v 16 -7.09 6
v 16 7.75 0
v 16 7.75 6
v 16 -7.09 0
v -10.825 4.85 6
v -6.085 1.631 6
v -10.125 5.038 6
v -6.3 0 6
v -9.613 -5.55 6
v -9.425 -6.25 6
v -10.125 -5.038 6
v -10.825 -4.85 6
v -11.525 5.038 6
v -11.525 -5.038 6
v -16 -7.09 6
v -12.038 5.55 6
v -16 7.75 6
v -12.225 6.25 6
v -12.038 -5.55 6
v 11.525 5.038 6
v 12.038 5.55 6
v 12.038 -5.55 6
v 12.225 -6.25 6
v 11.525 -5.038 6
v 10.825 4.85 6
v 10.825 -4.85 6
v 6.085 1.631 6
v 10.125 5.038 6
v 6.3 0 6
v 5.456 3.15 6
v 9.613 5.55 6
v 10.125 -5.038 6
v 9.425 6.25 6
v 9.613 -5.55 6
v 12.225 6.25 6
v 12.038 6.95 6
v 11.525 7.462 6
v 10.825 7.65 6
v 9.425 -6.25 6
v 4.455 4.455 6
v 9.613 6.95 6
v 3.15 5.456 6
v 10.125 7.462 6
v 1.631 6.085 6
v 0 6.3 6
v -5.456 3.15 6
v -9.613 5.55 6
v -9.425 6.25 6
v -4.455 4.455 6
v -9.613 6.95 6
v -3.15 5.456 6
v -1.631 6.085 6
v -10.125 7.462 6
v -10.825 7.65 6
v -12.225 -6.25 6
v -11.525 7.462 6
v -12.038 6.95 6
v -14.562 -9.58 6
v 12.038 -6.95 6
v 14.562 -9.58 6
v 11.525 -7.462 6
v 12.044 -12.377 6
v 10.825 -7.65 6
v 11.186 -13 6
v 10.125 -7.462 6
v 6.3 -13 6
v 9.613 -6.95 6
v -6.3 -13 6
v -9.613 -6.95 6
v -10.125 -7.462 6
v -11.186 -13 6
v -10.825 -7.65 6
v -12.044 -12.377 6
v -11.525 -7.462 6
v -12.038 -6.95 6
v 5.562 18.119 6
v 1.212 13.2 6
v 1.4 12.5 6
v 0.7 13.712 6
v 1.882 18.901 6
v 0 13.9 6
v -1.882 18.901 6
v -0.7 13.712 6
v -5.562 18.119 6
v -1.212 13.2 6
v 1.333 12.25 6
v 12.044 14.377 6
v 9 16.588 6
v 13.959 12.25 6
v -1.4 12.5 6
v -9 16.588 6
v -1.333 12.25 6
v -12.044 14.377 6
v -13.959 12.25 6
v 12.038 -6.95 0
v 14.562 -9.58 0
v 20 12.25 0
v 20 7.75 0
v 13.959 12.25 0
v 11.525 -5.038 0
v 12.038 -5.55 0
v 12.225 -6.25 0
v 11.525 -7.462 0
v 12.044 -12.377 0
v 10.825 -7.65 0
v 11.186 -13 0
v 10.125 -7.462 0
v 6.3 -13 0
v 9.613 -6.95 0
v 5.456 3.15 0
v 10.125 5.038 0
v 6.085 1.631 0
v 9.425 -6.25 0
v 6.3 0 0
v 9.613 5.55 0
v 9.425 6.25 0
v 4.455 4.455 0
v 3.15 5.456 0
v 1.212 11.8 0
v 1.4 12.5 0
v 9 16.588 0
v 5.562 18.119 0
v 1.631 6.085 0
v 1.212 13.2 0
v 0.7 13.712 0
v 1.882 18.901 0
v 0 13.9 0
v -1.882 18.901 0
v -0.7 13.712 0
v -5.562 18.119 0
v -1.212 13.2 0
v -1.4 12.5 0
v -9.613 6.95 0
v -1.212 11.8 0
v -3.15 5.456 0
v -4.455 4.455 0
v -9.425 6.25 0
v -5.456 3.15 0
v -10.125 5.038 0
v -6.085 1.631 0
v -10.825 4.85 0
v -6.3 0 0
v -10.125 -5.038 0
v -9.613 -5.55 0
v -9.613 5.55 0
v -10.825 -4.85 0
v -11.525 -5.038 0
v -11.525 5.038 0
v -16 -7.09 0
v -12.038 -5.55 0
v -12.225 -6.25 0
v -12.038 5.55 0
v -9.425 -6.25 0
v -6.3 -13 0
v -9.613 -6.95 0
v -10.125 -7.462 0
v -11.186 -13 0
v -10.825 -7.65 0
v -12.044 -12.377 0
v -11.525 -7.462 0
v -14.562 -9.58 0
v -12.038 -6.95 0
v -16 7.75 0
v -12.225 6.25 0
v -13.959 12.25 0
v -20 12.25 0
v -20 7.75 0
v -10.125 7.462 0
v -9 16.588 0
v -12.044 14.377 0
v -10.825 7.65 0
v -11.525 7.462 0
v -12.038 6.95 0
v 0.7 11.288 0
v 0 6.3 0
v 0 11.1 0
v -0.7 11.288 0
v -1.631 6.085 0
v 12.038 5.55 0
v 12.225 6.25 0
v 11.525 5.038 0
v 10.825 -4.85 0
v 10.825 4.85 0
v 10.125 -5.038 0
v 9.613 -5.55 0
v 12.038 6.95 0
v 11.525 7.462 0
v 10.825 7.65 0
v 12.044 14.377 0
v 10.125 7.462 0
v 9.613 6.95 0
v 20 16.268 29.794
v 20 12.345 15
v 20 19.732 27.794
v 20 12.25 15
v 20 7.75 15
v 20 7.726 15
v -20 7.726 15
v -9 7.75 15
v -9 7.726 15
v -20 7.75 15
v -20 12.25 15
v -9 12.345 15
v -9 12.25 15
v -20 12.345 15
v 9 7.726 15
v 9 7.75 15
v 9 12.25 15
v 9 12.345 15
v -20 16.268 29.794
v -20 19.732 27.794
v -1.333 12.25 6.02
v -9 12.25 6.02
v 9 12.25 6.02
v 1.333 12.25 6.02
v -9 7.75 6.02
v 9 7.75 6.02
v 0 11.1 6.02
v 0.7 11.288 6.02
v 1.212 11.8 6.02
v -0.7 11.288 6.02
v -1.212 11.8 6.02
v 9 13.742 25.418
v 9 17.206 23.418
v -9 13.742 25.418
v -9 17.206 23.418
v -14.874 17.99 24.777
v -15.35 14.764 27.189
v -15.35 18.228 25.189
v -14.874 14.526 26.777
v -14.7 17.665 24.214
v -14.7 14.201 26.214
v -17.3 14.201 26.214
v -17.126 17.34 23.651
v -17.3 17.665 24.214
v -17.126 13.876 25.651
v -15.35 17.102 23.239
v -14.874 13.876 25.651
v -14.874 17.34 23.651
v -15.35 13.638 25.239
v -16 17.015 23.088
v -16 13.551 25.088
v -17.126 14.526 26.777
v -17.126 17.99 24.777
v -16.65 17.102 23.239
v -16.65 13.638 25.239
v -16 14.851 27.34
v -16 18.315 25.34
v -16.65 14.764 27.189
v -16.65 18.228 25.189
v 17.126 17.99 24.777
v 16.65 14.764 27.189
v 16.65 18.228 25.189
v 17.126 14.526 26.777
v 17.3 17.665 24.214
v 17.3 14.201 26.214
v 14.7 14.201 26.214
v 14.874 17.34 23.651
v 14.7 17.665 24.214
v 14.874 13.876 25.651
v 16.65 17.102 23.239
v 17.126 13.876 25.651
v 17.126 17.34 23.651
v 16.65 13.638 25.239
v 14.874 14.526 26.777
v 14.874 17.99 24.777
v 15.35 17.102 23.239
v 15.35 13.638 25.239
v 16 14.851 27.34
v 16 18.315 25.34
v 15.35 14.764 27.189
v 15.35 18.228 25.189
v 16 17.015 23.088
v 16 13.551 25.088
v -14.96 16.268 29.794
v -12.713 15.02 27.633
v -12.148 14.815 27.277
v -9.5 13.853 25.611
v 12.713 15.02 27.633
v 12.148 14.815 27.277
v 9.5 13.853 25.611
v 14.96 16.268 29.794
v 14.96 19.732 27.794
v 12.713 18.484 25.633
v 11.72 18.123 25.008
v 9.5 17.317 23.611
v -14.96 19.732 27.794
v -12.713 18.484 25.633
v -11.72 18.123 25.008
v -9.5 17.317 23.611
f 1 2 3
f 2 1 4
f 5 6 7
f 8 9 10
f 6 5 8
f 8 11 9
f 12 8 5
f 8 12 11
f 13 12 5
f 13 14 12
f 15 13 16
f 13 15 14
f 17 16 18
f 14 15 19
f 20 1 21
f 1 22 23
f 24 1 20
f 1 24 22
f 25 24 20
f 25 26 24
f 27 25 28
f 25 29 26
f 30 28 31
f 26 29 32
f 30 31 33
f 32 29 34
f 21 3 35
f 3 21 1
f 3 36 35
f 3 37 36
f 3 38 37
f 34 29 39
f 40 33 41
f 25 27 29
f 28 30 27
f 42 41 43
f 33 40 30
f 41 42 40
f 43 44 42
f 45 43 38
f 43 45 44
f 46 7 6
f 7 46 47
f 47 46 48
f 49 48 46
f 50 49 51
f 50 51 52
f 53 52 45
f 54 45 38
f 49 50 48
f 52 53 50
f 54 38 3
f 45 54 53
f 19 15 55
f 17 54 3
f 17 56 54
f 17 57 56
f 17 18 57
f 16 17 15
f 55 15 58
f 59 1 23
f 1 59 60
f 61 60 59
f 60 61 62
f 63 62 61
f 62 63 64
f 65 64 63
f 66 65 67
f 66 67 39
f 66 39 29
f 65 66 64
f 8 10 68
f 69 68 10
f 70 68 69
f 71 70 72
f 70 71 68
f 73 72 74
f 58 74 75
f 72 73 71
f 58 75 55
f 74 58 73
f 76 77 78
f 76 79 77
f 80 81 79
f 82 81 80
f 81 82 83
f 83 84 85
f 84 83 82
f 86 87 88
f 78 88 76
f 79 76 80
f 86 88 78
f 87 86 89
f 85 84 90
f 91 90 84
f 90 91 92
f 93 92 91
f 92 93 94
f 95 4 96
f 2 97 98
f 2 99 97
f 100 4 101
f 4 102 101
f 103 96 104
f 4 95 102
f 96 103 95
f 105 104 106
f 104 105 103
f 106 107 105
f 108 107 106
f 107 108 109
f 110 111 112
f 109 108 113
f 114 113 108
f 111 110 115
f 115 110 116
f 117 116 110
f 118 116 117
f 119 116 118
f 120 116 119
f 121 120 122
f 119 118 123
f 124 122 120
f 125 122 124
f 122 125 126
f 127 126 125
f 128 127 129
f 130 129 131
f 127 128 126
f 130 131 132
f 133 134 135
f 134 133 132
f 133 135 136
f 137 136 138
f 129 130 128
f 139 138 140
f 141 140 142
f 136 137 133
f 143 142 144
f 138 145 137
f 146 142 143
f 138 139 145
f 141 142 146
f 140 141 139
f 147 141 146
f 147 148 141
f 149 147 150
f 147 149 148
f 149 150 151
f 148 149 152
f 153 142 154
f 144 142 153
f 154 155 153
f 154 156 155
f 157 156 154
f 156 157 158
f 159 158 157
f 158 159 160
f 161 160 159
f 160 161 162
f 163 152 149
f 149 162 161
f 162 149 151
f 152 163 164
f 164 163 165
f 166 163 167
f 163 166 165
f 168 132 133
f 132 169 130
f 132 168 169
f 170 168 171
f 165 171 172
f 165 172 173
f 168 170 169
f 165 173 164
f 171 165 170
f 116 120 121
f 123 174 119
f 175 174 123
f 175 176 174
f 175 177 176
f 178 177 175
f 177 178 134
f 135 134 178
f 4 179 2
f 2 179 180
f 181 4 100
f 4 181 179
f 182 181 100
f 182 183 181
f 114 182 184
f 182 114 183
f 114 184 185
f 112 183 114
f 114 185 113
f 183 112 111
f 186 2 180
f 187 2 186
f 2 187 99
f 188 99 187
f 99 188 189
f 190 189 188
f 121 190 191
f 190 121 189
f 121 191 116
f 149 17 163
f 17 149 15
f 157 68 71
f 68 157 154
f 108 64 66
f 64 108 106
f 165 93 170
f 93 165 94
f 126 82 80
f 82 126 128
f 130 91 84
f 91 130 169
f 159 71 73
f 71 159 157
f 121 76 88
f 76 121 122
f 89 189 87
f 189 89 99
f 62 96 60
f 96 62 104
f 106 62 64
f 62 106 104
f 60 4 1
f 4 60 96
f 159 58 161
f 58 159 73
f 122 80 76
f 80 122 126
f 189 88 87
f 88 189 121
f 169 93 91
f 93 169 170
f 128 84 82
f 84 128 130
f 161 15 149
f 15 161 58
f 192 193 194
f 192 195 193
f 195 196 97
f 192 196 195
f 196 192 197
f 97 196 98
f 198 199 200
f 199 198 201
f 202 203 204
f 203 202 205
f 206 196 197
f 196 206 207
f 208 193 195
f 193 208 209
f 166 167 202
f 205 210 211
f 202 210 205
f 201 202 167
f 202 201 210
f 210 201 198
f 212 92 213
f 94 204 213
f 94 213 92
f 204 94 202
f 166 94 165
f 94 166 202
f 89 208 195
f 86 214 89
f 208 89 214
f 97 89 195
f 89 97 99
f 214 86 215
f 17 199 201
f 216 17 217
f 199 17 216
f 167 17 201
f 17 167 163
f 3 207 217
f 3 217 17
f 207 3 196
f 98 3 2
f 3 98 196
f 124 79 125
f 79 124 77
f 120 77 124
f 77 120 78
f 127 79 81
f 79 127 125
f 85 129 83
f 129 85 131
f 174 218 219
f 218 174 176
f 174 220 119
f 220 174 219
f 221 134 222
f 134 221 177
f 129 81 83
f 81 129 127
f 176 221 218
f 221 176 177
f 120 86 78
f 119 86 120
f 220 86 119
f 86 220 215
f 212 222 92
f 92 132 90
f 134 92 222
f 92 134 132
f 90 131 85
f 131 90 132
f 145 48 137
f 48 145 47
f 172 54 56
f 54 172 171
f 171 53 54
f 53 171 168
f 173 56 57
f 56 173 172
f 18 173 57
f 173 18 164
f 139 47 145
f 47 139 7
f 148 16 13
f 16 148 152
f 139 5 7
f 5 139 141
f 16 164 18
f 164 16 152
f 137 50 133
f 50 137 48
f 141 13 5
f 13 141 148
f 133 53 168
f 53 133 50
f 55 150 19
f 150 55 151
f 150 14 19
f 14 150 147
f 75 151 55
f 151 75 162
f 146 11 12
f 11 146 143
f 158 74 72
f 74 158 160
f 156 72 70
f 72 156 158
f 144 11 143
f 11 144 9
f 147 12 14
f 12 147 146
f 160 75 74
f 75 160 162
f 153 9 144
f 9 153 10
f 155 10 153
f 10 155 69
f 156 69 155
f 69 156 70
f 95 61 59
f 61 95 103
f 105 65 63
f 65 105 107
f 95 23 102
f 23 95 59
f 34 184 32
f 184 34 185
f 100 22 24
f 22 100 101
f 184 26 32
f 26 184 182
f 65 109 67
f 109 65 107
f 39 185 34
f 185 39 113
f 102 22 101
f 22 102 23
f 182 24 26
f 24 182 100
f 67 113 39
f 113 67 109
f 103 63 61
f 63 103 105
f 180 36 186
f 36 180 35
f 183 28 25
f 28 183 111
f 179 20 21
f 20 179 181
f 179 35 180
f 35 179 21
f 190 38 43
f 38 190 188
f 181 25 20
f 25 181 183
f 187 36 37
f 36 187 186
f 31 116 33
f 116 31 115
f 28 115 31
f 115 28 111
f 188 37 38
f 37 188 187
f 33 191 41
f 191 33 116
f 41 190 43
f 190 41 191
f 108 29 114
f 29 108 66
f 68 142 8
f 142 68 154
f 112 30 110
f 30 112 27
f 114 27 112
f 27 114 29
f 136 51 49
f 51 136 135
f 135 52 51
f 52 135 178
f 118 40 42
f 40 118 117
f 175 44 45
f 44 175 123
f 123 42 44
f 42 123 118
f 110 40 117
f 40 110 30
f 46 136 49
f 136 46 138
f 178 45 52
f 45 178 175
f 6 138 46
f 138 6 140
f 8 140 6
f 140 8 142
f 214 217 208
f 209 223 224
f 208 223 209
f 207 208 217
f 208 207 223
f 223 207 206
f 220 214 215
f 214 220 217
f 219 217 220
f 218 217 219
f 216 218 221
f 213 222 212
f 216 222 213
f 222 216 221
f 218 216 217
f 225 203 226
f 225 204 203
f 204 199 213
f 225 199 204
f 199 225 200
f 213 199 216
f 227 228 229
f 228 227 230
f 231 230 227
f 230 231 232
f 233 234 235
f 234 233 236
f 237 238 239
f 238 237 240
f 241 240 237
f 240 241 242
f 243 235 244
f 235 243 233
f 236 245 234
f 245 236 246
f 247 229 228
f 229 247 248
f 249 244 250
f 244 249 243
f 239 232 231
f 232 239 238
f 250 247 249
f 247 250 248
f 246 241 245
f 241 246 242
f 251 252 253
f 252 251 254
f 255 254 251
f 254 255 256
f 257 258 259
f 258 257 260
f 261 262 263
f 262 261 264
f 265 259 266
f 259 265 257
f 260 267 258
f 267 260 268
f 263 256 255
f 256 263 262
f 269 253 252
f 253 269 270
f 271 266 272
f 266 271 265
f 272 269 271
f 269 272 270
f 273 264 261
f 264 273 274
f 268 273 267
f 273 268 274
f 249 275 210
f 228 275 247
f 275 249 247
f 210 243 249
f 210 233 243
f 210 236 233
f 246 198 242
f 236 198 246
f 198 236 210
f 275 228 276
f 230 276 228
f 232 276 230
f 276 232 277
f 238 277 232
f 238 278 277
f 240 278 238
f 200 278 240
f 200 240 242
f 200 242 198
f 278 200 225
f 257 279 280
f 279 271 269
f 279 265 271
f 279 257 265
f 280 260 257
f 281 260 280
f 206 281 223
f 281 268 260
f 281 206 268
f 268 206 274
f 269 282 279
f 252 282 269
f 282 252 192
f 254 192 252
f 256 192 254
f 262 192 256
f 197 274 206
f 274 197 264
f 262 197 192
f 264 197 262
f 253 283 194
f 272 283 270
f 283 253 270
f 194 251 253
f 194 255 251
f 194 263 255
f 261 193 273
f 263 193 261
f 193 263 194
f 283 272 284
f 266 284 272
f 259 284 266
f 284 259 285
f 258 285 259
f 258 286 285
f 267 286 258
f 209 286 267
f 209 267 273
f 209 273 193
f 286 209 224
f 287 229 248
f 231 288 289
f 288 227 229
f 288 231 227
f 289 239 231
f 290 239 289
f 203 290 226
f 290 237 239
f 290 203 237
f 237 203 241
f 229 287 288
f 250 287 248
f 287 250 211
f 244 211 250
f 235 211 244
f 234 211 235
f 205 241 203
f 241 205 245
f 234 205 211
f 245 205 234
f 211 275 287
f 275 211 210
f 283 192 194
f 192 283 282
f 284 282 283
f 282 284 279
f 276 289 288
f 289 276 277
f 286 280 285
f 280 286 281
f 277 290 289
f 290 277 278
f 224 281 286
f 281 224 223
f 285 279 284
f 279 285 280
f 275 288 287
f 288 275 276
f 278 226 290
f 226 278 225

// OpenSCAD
//Adaptation of the orginal hotend fan mount for the mini Kossel
//Tony@think3dprint3d.com
//Gpl v3

v0_6_x=33;
v0_6_y=37.5;
v0_6_center_y=(v0_6_y/2)-11.15-3; 
v0_6_center_x=0;
v0_6_hs_r=22.3/2;
v0_6_mount_r=8;
v0_6_slot_r=6;
v0_6_slot_h=6;
v0_6_slot_z_offset=0;
v0_6_mount_h=16.7;
v0_6_hs_h=26;
v6_mount_base_thickness=v0_6_slot_h;


barrel_radius = 8;
barrel_height = 30;

groove_radius = 6.3;
groove_height = 6;

fan_offset = 15;
fan_z_offset=15;
M3_tap_radius_vertical = 2.8/2;
M3_tap_radius_horizontal = 2.6/2;

//model of E3D v6 hotend
module v6(){
	translate([0,0,-v0_6_slot_z_offset-v0_6_slot_h])
	difference(){
		union() {
			translate([0,0,v0_6_mount_h/2])
				cylinder(r=v0_6_mount_r,h=v0_6_mount_h,center=true);
			translate([0,0,v0_6_mount_h+v0_6_hs_h/2])
				cylinder(r=v0_6_hs_r,h=v0_6_hs_h,center=true);
			translate([0,-4.25,v0_6_mount_h+v0_6_hs_h+2.8+11.5/2])
				cube([16,17.5,11.5],center=true);
		}
		difference(){
			translate([0,0,v0_6_slot_h/2+v0_6_slot_z_offset])
				cylinder(r=v0_6_mount_r+0.1,v0_6_slot_h+0.2,center=true);
			translate([0,0,v0_6_slot_h/2+v0_6_slot_z_offset])
				cylinder(r=v0_6_slot_r,h=v0_6_slot_h+0.1,center=true);
		}

	}
}

module hotend_fan() {
  difference() {
    union() {
      //translate([0, 0, groove_height/2])
      //  cube([32, 18, groove_height], center=true); //cube([32, 22, groove_height], center=true);
      translate([0, 10, fan_z_offset/2])
        cube([40, 4.5, fan_z_offset], center=true);
		translate([0, -10, groove_height/2])
		intersection(){
			translate([0,13,0])
      		cube([32, 32, groove_height], center=true);
			translate([0,11,0])
				cylinder(r=18, h = groove_height, $fn=30, center=true );
		}
    }
    translate([0, -10, 0])
      cube([2*groove_radius, 20, 20], center=true);
    // Groove mount.
    cylinder(r=groove_radius, h=200, center=true, $fn=24);
    translate([0, 10, 10+groove_height + 0.02])
      cube([2*(barrel_radius + 1), 20, 20],center=true);
		
    // v6 barrel.
    translate([0, 0, groove_height + 0.02])
      %v6();
		//
    for (a = [0:60:359]) {
      rotate([0, 0, a]) translate([0, 12.5, 5]) 
        cylinder(r=M3_tap_radius_vertical, h=12, center=true, $fn=12);
    }

  }
  //second fan mount
translate([0,0.5,fan_z_offset])
  difference(){
     translate([0, 13, 6]) rotate([60,0,0])
        cube([40, 18, 4], center=true); 
	 //cutout for second fan
 	 translate([0, 30, 20]) rotate([60,0,0])
	 cylinder(r=19, h=30, center=true);
    // Groove mount insert slot.
    translate([0, 10, 0])
      cube([2*groove_radius, 20, 20], center=true);
    translate([0, 10, groove_height + 0.02])
      cube([2*(barrel_radius + 1), 20, 20], center=true);
   //smooth bottom
    translate([0, 0,-10])
      cube([50, 50, 20], center=true);
    translate([0, 13, groove_height/2+4])
    rotate([-30,0,0])
	   for (x = [-16, 16]) {
        translate([x, 0, 4]) rotate([90, 0, 0]) 
          cylinder(r=M3_tap_radius_horizontal, h=16, center=true, $fn=12);
      }

  }
}

hotend_fan();


// second40mm fan.

translate([0, 30, 37])
rotate([-30,0,0]) 
% difference() {
  cube([40, 10, 40], center=true);
  rotate([90, 0, 0,]) cylinder(r=19, h=20, center=true);
}
